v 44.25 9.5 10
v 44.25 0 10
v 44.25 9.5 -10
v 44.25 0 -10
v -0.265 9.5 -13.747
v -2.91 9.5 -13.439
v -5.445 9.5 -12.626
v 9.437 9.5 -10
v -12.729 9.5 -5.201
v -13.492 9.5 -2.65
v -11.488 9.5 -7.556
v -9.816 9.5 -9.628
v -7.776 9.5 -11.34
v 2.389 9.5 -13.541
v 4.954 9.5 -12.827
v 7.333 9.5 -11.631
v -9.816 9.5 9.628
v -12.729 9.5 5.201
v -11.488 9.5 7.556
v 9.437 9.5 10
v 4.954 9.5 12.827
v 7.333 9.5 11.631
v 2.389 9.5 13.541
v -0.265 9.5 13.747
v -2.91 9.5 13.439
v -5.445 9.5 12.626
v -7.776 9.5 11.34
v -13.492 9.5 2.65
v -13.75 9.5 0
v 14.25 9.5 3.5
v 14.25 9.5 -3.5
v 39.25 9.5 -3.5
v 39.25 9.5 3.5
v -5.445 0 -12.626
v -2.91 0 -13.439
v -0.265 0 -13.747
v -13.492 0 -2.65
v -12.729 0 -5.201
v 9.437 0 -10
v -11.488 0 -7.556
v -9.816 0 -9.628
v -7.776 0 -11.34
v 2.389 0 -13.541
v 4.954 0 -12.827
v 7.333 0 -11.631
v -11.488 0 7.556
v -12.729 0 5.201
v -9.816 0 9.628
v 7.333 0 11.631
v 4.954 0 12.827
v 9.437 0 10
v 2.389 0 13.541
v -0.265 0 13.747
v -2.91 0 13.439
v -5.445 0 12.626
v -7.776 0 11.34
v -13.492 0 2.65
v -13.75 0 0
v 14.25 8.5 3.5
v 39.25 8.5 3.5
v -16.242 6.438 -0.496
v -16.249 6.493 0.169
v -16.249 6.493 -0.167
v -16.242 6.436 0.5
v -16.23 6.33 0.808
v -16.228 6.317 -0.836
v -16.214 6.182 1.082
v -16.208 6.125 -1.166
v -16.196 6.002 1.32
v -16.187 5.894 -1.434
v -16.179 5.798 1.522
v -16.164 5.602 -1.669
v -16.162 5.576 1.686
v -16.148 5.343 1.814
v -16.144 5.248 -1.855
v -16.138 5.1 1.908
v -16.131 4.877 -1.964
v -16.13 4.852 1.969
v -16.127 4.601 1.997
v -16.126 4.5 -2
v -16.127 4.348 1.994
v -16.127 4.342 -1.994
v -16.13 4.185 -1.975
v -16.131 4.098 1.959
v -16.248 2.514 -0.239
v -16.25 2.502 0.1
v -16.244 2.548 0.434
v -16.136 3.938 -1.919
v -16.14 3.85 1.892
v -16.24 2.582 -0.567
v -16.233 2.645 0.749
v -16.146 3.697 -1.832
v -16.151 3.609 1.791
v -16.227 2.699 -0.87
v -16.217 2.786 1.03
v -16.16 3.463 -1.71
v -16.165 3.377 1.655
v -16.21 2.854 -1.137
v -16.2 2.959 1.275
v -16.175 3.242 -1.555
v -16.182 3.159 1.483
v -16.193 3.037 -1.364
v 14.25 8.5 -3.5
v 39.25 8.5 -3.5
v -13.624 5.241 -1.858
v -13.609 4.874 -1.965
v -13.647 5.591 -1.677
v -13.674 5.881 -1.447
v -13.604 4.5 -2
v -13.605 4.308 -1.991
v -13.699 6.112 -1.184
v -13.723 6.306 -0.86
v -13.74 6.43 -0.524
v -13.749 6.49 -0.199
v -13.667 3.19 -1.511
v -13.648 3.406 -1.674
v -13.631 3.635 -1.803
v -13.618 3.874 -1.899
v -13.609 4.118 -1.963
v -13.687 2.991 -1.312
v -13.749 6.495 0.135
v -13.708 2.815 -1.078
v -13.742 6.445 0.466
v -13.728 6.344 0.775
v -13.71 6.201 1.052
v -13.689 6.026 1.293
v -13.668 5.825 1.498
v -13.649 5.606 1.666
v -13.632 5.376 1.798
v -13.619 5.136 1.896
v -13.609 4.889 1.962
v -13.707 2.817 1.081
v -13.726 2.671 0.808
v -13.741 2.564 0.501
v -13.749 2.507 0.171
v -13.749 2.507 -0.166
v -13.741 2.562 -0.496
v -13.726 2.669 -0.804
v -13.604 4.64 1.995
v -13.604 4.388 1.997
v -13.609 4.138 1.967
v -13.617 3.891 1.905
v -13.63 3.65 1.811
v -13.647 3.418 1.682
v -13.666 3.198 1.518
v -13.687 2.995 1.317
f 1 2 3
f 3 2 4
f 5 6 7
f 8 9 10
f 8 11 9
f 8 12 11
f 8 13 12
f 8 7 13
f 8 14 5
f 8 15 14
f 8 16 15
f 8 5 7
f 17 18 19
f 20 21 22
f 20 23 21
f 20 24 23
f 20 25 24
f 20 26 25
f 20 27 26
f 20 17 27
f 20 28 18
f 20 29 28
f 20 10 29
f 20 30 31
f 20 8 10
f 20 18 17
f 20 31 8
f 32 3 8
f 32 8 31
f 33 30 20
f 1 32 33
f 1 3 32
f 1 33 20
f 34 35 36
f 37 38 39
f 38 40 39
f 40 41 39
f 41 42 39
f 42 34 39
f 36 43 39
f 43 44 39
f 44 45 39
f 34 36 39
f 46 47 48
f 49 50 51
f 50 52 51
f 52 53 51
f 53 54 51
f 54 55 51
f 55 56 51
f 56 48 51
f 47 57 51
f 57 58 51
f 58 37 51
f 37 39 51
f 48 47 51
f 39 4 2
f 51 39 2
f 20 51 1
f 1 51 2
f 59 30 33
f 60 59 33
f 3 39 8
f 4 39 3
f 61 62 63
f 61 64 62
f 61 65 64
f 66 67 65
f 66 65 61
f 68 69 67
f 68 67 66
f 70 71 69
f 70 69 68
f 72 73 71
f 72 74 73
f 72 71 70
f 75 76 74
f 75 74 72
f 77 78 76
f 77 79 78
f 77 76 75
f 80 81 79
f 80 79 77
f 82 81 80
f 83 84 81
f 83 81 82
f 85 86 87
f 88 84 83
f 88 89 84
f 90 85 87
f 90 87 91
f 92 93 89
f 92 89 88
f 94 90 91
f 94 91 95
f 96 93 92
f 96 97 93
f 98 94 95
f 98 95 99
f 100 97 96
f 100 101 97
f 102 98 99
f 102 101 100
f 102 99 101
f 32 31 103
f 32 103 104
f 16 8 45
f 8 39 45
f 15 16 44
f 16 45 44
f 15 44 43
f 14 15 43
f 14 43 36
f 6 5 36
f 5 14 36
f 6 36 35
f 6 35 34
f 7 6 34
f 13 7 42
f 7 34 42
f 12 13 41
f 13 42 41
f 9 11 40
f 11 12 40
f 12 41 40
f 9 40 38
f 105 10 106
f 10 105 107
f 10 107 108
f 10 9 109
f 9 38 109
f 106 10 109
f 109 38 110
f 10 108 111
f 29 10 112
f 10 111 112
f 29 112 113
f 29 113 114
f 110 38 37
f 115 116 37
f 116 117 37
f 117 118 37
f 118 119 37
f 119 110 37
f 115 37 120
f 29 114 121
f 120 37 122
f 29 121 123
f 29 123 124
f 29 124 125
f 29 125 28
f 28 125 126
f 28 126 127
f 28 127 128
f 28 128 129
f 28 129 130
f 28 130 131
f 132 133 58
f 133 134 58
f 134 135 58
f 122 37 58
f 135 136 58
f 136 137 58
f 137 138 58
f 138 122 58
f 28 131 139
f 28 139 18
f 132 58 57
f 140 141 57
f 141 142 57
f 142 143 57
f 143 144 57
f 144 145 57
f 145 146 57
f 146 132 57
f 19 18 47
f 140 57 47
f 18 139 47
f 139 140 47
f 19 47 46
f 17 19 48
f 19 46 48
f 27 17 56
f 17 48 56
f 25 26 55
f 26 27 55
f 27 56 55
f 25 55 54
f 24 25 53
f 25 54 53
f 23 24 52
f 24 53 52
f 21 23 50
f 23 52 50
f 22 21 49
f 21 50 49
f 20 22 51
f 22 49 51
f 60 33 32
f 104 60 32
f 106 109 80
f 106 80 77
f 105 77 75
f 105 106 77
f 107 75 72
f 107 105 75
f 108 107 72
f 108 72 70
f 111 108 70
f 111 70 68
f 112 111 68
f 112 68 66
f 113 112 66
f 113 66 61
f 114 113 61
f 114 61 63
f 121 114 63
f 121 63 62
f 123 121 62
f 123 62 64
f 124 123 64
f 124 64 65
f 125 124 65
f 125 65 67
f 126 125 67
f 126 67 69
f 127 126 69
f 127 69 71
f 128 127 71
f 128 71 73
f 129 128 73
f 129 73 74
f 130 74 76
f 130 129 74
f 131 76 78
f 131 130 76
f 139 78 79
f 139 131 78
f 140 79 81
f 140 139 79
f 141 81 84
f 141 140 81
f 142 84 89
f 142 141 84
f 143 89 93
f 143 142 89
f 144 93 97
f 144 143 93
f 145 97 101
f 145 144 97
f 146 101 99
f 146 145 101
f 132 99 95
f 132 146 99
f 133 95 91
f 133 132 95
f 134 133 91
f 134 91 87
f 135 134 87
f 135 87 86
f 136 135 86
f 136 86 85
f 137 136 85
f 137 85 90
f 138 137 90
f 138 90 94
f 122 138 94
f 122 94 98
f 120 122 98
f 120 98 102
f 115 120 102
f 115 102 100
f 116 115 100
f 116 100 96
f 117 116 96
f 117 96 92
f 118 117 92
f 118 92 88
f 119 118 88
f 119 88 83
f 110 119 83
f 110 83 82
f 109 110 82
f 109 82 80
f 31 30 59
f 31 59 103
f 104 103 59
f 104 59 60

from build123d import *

# Parameters (mm, degrees)
SKETCH1_R                = 13.75
BOSS_EXTRUDE1_DEPTH      = 9.5
SKETCH2_W                = 44.25
SKETCH2_H                = 20
BOSS_EXTRUDE2_DEPTH      = 9.5
BOSS_EXTRUDE3_REACH      = 49.301
BOSS_EXTRUDE3_END_RADIUS = 16.25
SKETCH3_R                = 2
SKETCH4_W                = 25
SKETCH4_H                = 7
CUT_EXTRUDE1_DEPTH       = 1


with BuildPart() as part:
    # Sketch1 → Boss-Extrude1 (new body)
    with BuildSketch(Plane(origin=(0, 0, 0), x_dir=(1, 0, 0), z_dir=(0, 1, 0))):
        with Locations(Location((0, 0, 0), (0, 0, 270))):
            Circle(SKETCH1_R)
    extrude(amount=BOSS_EXTRUDE1_DEPTH)

    # Sketch2 → Boss-Extrude2 (add)
    with BuildSketch(Plane(origin=(0, 0, 0), x_dir=(1, 0, 0), z_dir=(0, 1, 0))):
        with Locations((22.125, 0)):
            Rectangle(SKETCH2_W, SKETCH2_H)
    extrude(amount=BOSS_EXTRUDE2_DEPTH)

    # Boss-Extrude3: up to this cylinder (the profile starts inside it)
    boss_extrude3_end = Plane(origin=(0, 4.5, 0), z_dir=(0, -1, 0)) * Cylinder(BOSS_EXTRUDE3_END_RADIUS, 132.102, mode=Mode.PRIVATE)
    # Sketch3 → Boss-Extrude3 (add, up to the surface)
    with BuildSketch(Plane(origin=(0, 0, 0), x_dir=(0, 0, -1), z_dir=(1, 0, 0)), mode=Mode.PRIVATE) as boss_extrude3_sk1:
        with Locations((0, 4.5)):
            Circle(SKETCH3_R)
    boss_extrude3_tool1 = extrude(boss_extrude3_sk1.sketch, amount=-BOSS_EXTRUDE3_REACH, mode=Mode.PRIVATE) & boss_extrude3_end
    add(boss_extrude3_tool1.solids().sort_by_distance((0, 4.5, 0))[0])

    # Sketch4 → Cut-Extrude1 (cut)
    with BuildSketch(Plane(origin=(0, 9.5, 0), x_dir=(1, 0, 0), z_dir=(0, 1, 0))):
        with Locations((26.75, 0)):
            Rectangle(SKETCH4_W, SKETCH4_H)
    extrude(amount=-CUT_EXTRUDE1_DEPTH, mode=Mode.SUBTRACT)


solid = part.part
